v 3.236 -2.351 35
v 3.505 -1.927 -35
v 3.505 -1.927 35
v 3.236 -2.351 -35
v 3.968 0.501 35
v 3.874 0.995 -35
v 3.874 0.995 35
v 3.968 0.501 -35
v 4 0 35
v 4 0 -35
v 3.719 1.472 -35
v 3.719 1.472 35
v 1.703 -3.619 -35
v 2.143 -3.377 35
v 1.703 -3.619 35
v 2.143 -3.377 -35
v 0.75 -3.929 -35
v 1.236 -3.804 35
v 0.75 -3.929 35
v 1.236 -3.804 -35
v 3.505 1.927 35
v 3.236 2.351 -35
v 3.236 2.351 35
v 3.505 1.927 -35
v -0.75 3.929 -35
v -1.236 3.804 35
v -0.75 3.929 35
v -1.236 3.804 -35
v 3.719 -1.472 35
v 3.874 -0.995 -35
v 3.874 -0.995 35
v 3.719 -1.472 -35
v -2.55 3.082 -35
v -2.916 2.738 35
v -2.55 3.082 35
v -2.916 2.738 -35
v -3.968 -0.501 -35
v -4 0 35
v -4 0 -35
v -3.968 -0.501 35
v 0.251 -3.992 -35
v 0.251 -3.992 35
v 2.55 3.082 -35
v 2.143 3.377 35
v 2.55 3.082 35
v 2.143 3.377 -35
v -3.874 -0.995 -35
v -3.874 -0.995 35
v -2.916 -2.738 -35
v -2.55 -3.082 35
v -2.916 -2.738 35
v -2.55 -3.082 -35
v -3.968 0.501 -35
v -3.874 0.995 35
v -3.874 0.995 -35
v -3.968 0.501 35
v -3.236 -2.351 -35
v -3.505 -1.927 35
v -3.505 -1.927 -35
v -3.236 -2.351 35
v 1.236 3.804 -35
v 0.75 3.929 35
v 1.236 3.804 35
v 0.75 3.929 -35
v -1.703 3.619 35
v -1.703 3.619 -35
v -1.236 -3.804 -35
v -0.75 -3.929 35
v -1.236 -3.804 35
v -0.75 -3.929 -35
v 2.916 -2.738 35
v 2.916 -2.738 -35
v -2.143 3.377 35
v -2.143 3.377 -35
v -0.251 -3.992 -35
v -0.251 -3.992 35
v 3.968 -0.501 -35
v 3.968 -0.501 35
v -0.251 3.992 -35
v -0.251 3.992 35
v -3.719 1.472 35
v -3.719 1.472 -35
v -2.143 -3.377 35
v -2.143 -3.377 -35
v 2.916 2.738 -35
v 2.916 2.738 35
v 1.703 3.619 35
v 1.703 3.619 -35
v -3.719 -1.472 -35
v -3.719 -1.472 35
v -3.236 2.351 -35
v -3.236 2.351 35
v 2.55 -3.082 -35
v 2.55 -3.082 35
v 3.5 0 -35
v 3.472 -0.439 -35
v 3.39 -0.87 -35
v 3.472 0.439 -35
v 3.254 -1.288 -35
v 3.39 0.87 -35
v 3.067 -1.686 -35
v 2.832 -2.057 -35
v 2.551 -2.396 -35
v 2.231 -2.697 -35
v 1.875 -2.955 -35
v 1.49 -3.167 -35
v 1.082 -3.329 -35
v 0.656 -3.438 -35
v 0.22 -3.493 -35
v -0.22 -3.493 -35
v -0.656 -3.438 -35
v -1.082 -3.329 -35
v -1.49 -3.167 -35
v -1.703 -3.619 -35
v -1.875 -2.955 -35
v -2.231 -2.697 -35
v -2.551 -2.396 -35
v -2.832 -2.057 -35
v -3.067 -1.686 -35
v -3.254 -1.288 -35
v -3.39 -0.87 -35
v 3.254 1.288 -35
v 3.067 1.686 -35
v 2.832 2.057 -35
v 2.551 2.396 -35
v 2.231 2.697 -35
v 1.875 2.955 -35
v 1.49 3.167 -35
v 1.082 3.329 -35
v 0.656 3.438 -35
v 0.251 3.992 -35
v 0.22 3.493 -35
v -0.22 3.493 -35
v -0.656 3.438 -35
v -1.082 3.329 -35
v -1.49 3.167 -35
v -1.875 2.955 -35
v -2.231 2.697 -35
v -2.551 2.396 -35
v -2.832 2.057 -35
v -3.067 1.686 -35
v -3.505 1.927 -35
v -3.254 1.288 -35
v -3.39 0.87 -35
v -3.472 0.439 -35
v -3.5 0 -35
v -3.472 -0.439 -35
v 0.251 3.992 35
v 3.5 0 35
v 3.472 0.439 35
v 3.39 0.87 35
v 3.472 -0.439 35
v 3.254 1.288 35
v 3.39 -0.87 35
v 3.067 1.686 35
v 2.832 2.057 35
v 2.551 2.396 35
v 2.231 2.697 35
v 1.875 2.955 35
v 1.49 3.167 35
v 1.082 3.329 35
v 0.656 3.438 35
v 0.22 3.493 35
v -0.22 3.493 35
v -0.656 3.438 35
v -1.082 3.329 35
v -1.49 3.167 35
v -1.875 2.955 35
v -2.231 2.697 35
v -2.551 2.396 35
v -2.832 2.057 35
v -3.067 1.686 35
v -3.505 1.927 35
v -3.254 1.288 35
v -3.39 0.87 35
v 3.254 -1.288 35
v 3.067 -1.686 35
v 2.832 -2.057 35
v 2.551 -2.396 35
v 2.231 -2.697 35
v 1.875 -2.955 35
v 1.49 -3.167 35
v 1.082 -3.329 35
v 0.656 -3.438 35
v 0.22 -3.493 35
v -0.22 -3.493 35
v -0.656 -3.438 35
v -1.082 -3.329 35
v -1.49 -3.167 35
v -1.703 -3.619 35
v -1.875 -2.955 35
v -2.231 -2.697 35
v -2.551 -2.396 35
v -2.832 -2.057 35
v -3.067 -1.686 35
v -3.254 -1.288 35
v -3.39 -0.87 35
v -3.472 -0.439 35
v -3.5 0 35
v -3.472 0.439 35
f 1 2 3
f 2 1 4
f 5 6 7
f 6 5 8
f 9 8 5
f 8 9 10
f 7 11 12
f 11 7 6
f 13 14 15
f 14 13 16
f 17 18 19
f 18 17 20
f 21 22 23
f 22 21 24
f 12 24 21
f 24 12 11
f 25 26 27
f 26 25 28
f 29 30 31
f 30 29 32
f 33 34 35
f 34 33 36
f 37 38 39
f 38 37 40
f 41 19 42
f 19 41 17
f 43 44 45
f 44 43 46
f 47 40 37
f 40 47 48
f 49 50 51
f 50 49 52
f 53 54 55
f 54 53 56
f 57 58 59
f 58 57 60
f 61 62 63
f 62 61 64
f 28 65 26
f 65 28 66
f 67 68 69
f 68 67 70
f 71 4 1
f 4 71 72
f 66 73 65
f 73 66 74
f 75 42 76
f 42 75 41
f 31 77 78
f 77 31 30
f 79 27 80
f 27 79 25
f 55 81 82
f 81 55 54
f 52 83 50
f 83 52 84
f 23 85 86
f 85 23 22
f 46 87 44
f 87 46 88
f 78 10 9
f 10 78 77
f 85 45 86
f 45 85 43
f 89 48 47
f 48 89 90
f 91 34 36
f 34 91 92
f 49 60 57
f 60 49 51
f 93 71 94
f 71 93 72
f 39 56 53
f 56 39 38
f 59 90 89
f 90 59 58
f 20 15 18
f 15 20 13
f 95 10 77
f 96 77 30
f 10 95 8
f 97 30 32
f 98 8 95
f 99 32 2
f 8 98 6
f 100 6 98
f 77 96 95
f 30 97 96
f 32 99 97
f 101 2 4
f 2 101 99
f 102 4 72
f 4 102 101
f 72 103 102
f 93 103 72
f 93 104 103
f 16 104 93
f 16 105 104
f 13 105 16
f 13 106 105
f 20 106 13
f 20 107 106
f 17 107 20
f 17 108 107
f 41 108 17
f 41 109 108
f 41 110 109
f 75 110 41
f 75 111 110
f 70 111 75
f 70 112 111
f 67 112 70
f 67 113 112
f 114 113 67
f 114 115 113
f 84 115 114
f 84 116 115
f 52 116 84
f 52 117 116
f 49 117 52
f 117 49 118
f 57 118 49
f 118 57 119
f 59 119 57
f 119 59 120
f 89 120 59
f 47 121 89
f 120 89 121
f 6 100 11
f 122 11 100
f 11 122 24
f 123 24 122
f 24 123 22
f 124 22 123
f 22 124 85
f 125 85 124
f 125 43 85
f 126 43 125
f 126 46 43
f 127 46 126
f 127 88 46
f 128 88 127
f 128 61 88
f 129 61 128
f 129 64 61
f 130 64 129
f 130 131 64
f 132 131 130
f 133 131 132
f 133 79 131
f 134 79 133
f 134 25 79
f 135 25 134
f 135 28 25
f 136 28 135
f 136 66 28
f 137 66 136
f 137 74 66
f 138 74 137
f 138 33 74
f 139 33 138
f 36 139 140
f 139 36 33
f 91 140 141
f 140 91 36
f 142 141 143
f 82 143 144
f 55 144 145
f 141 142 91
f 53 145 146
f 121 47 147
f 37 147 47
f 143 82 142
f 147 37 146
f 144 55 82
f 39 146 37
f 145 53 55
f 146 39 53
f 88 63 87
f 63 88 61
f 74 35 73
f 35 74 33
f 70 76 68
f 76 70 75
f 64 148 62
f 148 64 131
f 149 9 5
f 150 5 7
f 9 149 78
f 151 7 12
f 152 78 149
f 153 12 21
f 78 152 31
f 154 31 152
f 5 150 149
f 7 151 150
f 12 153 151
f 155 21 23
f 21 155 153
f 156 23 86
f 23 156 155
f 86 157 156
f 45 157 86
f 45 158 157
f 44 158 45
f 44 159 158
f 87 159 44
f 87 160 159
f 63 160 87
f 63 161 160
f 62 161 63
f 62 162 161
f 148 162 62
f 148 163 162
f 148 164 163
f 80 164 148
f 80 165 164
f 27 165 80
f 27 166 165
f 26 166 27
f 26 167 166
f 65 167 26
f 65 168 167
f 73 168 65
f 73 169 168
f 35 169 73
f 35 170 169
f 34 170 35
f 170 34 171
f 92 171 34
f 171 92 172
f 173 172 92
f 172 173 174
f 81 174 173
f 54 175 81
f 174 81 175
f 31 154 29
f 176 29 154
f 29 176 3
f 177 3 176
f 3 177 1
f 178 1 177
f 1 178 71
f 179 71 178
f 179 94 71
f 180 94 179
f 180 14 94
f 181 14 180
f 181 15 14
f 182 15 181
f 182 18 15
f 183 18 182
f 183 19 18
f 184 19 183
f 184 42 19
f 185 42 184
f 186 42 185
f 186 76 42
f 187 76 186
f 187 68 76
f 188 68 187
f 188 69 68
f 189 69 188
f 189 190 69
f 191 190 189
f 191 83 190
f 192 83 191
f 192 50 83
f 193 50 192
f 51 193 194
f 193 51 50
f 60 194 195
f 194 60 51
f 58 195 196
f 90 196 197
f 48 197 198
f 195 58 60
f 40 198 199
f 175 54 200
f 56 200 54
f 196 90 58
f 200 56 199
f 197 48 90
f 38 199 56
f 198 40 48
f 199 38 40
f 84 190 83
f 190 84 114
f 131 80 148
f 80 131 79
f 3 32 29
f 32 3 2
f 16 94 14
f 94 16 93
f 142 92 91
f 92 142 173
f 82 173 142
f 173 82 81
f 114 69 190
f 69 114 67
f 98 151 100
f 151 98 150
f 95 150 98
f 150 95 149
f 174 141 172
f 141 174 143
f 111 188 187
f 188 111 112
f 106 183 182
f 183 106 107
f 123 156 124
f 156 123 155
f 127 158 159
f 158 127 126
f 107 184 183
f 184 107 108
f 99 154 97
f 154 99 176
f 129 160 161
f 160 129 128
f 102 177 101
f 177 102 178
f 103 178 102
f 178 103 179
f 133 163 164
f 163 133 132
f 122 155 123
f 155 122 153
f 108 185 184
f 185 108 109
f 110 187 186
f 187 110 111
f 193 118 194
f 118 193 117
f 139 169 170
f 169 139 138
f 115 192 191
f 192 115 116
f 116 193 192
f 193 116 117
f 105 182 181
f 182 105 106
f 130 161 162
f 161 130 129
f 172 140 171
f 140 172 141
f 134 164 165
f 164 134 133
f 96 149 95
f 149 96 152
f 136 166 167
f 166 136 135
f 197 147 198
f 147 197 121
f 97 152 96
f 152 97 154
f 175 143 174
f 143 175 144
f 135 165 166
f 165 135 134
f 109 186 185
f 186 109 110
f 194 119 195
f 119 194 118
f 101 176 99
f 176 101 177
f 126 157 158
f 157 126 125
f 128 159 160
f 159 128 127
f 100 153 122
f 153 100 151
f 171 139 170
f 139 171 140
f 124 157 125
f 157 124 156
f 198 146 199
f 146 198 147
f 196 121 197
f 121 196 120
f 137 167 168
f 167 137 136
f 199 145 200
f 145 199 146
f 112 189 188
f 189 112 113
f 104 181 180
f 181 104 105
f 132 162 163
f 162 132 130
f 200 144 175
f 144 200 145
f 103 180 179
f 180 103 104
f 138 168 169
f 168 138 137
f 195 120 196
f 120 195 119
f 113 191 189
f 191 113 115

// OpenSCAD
$fn = 50;


difference() {
	union() {
		translate(v = [0, 0, -35.0000000000]) {
			cylinder(h = 70, r = 4.0000000000);
		}
	}
	union() {
		translate(v = [0, 0, -100.0000000000]) {
			cylinder(h = 200, r = 3.5000000000);
		}
	}
}
